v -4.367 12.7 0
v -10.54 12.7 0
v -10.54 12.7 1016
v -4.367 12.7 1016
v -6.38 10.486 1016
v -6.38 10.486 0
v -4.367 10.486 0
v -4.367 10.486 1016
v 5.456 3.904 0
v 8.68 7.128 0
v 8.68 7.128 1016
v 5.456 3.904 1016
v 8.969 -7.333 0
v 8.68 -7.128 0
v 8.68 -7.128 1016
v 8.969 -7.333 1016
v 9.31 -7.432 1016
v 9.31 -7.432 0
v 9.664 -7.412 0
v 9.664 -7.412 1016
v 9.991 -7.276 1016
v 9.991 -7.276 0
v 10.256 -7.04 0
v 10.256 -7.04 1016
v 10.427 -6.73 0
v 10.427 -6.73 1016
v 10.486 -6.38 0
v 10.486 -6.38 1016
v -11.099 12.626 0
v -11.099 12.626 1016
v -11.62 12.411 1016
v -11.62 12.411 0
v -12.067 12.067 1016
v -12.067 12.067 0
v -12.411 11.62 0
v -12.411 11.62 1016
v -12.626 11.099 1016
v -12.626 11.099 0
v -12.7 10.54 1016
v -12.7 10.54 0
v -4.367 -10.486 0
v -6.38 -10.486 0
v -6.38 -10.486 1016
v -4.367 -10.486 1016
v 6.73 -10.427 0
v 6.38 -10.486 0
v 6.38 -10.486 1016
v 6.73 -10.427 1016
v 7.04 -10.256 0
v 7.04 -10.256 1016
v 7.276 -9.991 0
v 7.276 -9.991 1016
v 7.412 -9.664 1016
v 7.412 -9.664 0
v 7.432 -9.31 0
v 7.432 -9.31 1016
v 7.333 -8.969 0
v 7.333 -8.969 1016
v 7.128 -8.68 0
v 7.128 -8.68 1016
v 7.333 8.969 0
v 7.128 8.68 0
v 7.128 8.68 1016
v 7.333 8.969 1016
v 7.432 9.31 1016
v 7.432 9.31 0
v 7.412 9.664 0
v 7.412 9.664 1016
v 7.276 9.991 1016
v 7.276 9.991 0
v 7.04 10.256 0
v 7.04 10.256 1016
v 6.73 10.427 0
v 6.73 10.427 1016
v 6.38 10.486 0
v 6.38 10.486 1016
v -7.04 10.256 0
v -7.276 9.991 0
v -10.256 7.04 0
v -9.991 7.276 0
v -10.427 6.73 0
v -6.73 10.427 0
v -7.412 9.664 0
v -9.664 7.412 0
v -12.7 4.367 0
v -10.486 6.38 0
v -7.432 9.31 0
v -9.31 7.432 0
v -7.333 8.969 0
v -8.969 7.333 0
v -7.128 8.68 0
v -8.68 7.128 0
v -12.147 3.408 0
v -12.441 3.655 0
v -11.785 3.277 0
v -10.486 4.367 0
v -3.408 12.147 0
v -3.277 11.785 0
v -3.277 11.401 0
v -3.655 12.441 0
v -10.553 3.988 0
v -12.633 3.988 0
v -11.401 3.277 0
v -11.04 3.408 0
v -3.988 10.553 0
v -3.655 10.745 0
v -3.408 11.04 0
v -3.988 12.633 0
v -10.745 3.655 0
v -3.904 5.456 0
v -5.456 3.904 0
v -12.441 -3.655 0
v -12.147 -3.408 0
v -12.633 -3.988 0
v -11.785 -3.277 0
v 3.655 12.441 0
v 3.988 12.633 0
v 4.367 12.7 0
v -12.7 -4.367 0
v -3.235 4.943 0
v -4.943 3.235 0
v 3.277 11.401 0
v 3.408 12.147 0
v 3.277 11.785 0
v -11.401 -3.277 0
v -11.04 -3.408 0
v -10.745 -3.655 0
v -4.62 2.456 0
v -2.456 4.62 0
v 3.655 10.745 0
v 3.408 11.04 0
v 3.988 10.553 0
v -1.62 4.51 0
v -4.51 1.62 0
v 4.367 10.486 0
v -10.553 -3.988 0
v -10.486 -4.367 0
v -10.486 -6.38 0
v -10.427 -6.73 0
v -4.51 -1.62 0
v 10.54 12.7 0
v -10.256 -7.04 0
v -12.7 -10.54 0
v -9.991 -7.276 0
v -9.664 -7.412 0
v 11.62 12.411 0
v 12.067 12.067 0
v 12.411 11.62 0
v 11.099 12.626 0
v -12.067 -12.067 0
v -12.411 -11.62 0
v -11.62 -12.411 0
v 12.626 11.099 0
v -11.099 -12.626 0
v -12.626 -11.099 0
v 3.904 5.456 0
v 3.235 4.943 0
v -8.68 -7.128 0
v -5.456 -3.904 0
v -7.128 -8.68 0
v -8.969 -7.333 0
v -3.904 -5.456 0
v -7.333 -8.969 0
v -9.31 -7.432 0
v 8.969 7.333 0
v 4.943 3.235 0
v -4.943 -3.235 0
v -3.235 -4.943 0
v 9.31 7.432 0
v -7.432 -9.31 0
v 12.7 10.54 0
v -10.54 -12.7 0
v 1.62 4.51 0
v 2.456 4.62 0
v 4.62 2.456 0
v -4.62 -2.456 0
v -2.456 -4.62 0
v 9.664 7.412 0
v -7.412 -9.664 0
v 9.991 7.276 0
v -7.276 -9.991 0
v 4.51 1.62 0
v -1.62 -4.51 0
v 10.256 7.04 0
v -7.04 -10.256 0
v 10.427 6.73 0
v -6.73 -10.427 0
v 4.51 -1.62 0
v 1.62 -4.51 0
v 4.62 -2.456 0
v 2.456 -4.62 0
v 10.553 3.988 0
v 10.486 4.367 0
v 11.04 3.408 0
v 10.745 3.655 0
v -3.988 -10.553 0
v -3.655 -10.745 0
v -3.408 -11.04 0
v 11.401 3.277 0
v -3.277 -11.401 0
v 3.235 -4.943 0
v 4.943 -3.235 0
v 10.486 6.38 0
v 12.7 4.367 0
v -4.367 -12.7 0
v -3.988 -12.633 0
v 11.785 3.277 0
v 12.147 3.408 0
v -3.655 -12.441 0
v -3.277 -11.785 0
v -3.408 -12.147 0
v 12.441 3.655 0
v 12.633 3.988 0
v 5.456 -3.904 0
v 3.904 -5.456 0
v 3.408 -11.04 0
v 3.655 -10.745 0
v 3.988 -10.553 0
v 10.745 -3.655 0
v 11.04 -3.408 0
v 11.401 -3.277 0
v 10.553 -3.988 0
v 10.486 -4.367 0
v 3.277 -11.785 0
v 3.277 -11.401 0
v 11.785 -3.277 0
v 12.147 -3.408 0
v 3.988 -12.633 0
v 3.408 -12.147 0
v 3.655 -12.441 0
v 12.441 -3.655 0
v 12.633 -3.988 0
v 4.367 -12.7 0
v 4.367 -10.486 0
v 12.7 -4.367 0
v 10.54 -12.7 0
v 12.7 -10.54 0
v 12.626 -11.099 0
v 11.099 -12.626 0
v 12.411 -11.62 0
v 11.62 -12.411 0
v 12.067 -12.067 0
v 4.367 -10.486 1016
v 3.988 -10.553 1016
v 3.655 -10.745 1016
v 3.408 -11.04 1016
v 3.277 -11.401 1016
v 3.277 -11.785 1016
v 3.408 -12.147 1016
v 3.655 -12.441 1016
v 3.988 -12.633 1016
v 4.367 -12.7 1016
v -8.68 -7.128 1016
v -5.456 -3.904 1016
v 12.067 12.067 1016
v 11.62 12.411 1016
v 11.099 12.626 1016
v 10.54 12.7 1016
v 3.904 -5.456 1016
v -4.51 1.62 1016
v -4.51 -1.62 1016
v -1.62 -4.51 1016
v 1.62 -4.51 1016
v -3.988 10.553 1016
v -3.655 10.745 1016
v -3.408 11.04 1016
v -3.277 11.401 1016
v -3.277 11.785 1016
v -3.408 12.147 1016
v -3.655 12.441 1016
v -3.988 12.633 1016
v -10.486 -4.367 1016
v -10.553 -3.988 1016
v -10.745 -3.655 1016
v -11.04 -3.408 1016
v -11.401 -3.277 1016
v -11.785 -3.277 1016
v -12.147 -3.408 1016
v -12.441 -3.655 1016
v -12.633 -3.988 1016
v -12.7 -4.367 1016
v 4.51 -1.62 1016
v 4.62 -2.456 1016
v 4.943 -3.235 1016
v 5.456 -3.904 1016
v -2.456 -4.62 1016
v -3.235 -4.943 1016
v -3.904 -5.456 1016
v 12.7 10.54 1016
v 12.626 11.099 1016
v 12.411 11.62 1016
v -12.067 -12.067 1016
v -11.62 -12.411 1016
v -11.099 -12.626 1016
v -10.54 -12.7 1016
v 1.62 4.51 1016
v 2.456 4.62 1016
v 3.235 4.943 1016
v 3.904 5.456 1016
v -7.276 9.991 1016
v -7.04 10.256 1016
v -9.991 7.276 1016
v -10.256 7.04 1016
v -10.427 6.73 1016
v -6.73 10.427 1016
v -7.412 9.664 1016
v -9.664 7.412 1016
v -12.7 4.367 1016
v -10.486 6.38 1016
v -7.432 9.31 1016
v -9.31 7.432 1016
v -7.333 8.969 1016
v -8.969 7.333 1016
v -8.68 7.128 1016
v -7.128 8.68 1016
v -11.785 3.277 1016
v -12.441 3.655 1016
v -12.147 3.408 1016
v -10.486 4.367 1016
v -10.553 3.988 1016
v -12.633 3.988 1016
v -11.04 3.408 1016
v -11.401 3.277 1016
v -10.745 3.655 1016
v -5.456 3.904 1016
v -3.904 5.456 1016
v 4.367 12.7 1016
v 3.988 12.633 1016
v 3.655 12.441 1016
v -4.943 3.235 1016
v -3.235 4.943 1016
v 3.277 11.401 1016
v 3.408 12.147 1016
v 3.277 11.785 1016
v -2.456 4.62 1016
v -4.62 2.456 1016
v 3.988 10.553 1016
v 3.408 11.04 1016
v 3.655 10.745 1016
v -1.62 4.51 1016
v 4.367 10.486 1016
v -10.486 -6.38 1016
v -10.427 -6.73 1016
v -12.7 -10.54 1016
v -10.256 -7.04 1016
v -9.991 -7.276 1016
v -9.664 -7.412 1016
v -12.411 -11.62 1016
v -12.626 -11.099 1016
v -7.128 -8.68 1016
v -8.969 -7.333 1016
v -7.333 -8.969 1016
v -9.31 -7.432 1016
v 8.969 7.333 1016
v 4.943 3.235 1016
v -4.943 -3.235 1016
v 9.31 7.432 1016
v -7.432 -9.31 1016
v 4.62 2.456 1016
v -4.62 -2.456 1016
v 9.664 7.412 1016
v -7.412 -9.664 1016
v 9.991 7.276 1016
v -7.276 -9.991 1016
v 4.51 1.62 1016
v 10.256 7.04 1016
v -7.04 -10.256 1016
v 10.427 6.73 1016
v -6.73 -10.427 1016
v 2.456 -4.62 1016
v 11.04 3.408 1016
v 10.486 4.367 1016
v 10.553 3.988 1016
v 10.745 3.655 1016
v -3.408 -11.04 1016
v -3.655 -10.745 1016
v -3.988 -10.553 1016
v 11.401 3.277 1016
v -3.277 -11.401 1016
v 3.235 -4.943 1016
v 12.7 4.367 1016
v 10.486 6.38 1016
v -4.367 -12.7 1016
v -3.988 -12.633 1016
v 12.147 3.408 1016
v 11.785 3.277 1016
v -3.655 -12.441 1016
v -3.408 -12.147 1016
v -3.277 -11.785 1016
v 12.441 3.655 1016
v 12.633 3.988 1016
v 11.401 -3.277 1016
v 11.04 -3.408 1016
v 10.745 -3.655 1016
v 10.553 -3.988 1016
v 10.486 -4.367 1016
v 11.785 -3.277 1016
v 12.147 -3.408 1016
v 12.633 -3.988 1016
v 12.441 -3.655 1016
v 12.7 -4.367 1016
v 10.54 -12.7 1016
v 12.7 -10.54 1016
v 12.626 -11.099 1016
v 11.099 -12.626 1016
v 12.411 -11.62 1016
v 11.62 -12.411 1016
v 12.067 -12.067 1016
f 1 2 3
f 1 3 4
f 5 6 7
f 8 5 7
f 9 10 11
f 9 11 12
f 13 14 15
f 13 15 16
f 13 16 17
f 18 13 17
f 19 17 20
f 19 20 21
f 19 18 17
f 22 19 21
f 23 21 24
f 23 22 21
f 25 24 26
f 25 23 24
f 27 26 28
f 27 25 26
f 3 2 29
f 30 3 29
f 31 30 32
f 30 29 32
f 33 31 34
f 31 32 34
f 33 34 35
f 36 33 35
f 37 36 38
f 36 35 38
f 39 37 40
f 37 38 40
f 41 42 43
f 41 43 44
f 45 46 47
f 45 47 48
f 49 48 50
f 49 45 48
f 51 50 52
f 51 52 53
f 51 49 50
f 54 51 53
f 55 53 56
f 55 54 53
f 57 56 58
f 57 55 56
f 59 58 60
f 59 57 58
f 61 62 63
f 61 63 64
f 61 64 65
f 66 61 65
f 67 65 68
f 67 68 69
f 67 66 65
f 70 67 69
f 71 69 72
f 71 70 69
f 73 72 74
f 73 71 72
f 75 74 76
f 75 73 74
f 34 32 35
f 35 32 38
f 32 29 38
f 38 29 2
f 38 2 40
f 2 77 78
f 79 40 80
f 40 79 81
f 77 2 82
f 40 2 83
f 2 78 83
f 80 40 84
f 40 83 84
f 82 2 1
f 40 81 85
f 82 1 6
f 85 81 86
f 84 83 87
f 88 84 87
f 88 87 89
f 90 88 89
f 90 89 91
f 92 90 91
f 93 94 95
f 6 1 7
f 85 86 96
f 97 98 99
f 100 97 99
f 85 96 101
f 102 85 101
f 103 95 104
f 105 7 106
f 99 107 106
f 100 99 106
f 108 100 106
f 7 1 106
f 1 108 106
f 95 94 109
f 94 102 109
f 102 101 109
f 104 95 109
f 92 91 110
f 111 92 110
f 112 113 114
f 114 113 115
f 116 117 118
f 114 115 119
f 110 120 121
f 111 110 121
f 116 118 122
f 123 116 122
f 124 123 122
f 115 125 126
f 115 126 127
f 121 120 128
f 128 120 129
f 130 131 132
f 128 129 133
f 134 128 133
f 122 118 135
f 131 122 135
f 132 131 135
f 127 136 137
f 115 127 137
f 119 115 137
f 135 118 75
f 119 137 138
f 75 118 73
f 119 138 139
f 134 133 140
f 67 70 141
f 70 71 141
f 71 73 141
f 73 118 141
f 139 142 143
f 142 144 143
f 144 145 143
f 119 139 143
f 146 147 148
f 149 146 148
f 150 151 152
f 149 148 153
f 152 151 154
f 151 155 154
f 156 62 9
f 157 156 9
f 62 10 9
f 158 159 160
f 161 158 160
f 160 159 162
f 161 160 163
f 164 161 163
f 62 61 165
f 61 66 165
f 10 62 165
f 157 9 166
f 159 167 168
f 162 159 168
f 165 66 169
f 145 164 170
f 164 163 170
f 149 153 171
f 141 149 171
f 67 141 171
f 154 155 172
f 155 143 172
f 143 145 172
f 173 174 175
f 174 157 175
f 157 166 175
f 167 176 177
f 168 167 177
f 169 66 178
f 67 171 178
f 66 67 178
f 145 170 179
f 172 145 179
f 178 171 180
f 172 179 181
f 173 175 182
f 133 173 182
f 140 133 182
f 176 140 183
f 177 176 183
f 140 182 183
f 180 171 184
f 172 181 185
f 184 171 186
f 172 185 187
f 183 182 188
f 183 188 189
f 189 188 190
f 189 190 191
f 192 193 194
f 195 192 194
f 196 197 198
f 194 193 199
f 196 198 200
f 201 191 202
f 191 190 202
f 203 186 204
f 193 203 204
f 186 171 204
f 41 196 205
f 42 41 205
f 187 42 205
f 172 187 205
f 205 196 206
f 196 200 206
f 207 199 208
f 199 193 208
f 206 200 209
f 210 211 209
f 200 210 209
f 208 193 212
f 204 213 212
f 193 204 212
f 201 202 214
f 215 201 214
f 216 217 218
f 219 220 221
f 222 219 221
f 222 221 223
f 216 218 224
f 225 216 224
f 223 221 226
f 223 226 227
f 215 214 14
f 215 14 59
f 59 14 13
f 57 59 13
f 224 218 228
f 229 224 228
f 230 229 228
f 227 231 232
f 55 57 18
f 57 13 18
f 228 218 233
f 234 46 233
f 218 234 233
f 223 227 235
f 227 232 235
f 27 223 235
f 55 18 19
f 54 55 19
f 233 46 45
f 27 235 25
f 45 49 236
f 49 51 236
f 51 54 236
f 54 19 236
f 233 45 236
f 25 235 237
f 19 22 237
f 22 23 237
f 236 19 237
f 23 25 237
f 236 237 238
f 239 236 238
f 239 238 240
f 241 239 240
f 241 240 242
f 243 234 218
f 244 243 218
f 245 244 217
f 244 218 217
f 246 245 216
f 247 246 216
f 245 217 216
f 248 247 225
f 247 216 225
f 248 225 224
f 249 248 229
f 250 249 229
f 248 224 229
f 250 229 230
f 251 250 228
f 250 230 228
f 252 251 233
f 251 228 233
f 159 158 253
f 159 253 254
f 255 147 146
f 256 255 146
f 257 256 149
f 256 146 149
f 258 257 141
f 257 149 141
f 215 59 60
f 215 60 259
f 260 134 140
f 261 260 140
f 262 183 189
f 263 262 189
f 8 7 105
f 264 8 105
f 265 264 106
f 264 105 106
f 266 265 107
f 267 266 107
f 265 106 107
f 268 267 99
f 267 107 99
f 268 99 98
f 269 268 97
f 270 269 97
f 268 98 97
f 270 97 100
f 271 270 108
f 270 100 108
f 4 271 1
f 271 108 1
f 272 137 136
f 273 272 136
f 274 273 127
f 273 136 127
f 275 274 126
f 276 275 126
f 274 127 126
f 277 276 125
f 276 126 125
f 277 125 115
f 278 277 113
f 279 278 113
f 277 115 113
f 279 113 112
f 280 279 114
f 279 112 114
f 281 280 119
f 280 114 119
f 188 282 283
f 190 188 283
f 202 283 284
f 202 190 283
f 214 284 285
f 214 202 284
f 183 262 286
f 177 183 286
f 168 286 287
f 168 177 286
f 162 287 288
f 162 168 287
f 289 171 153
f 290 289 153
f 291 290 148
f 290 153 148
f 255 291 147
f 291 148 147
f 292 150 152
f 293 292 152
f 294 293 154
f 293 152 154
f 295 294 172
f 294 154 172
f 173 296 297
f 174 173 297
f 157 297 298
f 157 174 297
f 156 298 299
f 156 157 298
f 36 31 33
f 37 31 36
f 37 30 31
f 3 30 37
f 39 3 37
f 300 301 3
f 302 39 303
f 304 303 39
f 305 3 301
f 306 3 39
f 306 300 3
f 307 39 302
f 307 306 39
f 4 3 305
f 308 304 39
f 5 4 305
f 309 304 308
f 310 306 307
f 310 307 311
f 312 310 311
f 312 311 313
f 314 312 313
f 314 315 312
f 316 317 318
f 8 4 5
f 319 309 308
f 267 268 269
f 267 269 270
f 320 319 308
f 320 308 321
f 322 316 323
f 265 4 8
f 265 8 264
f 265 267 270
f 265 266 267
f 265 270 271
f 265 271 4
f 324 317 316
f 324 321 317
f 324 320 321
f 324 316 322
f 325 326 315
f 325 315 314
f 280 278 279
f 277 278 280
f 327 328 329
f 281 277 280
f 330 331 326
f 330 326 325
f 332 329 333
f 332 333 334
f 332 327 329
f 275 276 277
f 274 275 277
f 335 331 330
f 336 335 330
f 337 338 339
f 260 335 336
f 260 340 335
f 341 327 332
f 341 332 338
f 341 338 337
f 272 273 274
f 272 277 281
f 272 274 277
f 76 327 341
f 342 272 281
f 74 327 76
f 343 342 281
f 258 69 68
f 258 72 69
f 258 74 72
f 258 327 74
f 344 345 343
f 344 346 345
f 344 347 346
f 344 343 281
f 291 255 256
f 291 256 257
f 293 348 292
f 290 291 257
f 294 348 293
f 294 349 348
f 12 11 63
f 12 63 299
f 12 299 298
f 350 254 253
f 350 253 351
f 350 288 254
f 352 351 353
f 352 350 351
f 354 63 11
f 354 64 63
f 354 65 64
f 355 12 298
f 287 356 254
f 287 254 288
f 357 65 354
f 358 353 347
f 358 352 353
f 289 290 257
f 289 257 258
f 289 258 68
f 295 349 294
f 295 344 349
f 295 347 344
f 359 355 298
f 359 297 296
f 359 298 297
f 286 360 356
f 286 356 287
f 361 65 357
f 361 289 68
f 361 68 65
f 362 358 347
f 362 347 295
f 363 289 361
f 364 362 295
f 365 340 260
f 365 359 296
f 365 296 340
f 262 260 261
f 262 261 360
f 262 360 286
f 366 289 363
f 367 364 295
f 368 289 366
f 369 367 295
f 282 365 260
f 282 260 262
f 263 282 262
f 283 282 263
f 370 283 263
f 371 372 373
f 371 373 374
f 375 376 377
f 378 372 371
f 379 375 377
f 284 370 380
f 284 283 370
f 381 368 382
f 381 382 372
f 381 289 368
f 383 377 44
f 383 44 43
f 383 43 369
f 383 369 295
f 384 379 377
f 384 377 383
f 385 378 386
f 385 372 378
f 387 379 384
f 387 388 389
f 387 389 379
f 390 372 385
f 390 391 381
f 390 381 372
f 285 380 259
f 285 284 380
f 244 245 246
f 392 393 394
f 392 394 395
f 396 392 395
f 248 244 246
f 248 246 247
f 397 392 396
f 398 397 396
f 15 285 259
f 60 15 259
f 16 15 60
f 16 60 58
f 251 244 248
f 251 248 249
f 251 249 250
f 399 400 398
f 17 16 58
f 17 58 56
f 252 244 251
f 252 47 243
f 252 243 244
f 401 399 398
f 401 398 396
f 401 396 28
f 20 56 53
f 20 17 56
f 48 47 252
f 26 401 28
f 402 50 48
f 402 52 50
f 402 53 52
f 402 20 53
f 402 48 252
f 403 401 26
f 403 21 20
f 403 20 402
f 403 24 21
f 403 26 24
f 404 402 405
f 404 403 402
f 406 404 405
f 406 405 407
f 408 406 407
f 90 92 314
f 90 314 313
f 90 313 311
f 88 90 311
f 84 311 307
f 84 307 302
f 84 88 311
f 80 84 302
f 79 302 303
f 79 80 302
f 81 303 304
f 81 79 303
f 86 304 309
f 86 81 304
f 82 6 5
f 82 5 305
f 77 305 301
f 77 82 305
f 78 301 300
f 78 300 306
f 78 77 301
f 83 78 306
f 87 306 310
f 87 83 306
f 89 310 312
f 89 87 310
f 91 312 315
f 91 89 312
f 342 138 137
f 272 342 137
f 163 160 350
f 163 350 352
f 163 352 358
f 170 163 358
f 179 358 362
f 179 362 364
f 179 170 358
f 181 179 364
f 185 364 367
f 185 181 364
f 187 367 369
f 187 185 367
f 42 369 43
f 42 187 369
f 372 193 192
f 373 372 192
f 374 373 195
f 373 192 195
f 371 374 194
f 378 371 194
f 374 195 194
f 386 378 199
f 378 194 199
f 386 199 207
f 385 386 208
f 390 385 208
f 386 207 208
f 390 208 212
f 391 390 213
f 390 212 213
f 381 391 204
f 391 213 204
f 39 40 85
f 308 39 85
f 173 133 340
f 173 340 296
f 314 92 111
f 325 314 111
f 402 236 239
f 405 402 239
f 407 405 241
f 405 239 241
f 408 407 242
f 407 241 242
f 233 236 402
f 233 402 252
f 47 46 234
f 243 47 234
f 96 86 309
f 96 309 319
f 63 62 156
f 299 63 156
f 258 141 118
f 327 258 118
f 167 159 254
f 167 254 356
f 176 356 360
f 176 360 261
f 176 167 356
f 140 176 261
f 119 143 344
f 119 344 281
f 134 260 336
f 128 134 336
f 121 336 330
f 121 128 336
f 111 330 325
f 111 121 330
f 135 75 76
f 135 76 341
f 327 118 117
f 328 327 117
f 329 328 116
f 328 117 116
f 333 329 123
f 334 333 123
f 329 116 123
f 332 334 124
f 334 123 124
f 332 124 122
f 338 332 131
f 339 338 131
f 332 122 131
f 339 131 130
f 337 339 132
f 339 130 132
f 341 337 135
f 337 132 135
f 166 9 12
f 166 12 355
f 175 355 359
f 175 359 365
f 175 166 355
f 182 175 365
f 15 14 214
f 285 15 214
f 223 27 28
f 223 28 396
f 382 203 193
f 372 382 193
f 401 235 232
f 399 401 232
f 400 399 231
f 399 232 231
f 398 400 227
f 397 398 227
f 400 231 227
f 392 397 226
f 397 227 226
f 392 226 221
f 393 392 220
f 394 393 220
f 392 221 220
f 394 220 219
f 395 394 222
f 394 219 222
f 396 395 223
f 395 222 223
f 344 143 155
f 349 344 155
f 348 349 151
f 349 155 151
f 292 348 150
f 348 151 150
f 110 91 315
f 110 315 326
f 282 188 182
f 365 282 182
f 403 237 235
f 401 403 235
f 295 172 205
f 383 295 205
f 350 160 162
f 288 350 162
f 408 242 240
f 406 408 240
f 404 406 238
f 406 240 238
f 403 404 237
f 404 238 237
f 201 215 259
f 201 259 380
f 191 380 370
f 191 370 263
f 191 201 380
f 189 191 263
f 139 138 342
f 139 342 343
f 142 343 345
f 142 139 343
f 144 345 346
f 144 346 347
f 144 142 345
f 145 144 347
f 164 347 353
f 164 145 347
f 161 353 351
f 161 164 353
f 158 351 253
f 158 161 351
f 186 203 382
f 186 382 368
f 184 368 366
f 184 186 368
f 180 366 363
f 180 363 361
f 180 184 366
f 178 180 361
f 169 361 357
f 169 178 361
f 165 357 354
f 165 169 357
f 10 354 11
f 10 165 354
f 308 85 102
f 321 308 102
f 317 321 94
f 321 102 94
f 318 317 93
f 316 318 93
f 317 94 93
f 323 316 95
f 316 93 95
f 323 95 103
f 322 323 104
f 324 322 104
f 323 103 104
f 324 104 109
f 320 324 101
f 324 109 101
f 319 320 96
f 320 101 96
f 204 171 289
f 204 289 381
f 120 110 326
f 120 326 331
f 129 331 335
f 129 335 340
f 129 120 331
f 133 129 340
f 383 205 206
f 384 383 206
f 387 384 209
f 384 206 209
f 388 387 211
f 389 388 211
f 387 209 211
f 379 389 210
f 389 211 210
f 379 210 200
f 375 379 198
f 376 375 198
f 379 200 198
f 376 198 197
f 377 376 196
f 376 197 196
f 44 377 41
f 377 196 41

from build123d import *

# Parameters (mm, degrees)
PAD_DEPTH          = 1016
POLARPATTERN_COUNT = 4


with BuildPart() as part:
    # Sketch → Pad (new body)
    with BuildSketch(Plane.XY):
        with BuildLine():
            Line((0, 4.51), (-1.62, 4.51))
            ThreePointArc((-3.903955, 5.456045), (-2.856067, 4.755869), (-1.62, 4.51))
            Line((-7.128362, 8.680452), (-3.903955, 5.456045))
            ThreePointArc((-6.380316, 10.486396), (-7.357685, 9.833338), (-7.128362, 8.680452))
            Line((-6.380316, 10.486396), (-4.366802, 10.486396))
            ThreePointArc((-4.366802, 10.486396), (-3.26, 11.593198), (-4.366802, 12.7))
            Line((-10.54, 12.7), (-4.366802, 12.7))
            ThreePointArc((-10.54, 12.7), (-11.366596, 12.53558), (-12.067351, 12.067351))
            ThreePointArc((-12.067351, 12.067351), (-12.53558, 11.366596), (-12.7, 10.54))
            Line((-12.7, 10.54), (-12.7, 4.366802))
            ThreePointArc((-12.7, 4.366802), (-11.593198, 3.26), (-10.486396, 4.366802))
            Line((-10.486396, 6.380316), (-10.486396, 4.366802))
            ThreePointArc((-8.680452, 7.128362), (-9.833338, 7.357685), (-10.486396, 6.380316))
            Line((-8.680452, 7.128362), (-5.456045, 3.903955))
            ThreePointArc((-4.51, 1.62), (-4.755869, 2.856067), (-5.456045, 3.903955))
            Line((-4.51, 0), (-4.51, 1.62))
            Line((0, 0), (-4.51, 0))
            Line((0, 4.51), (0, 0))
        make_face()
    pad = extrude(amount=PAD_DEPTH)

    # PolarPattern: Pad ×4 about axis
    polarpattern_axis = Axis((0, 0, 0), (0, 0, 1))
    for i in range(1, POLARPATTERN_COUNT):
        add(pad.rotate(polarpattern_axis, i * 360 / POLARPATTERN_COUNT))


solid = part.part
